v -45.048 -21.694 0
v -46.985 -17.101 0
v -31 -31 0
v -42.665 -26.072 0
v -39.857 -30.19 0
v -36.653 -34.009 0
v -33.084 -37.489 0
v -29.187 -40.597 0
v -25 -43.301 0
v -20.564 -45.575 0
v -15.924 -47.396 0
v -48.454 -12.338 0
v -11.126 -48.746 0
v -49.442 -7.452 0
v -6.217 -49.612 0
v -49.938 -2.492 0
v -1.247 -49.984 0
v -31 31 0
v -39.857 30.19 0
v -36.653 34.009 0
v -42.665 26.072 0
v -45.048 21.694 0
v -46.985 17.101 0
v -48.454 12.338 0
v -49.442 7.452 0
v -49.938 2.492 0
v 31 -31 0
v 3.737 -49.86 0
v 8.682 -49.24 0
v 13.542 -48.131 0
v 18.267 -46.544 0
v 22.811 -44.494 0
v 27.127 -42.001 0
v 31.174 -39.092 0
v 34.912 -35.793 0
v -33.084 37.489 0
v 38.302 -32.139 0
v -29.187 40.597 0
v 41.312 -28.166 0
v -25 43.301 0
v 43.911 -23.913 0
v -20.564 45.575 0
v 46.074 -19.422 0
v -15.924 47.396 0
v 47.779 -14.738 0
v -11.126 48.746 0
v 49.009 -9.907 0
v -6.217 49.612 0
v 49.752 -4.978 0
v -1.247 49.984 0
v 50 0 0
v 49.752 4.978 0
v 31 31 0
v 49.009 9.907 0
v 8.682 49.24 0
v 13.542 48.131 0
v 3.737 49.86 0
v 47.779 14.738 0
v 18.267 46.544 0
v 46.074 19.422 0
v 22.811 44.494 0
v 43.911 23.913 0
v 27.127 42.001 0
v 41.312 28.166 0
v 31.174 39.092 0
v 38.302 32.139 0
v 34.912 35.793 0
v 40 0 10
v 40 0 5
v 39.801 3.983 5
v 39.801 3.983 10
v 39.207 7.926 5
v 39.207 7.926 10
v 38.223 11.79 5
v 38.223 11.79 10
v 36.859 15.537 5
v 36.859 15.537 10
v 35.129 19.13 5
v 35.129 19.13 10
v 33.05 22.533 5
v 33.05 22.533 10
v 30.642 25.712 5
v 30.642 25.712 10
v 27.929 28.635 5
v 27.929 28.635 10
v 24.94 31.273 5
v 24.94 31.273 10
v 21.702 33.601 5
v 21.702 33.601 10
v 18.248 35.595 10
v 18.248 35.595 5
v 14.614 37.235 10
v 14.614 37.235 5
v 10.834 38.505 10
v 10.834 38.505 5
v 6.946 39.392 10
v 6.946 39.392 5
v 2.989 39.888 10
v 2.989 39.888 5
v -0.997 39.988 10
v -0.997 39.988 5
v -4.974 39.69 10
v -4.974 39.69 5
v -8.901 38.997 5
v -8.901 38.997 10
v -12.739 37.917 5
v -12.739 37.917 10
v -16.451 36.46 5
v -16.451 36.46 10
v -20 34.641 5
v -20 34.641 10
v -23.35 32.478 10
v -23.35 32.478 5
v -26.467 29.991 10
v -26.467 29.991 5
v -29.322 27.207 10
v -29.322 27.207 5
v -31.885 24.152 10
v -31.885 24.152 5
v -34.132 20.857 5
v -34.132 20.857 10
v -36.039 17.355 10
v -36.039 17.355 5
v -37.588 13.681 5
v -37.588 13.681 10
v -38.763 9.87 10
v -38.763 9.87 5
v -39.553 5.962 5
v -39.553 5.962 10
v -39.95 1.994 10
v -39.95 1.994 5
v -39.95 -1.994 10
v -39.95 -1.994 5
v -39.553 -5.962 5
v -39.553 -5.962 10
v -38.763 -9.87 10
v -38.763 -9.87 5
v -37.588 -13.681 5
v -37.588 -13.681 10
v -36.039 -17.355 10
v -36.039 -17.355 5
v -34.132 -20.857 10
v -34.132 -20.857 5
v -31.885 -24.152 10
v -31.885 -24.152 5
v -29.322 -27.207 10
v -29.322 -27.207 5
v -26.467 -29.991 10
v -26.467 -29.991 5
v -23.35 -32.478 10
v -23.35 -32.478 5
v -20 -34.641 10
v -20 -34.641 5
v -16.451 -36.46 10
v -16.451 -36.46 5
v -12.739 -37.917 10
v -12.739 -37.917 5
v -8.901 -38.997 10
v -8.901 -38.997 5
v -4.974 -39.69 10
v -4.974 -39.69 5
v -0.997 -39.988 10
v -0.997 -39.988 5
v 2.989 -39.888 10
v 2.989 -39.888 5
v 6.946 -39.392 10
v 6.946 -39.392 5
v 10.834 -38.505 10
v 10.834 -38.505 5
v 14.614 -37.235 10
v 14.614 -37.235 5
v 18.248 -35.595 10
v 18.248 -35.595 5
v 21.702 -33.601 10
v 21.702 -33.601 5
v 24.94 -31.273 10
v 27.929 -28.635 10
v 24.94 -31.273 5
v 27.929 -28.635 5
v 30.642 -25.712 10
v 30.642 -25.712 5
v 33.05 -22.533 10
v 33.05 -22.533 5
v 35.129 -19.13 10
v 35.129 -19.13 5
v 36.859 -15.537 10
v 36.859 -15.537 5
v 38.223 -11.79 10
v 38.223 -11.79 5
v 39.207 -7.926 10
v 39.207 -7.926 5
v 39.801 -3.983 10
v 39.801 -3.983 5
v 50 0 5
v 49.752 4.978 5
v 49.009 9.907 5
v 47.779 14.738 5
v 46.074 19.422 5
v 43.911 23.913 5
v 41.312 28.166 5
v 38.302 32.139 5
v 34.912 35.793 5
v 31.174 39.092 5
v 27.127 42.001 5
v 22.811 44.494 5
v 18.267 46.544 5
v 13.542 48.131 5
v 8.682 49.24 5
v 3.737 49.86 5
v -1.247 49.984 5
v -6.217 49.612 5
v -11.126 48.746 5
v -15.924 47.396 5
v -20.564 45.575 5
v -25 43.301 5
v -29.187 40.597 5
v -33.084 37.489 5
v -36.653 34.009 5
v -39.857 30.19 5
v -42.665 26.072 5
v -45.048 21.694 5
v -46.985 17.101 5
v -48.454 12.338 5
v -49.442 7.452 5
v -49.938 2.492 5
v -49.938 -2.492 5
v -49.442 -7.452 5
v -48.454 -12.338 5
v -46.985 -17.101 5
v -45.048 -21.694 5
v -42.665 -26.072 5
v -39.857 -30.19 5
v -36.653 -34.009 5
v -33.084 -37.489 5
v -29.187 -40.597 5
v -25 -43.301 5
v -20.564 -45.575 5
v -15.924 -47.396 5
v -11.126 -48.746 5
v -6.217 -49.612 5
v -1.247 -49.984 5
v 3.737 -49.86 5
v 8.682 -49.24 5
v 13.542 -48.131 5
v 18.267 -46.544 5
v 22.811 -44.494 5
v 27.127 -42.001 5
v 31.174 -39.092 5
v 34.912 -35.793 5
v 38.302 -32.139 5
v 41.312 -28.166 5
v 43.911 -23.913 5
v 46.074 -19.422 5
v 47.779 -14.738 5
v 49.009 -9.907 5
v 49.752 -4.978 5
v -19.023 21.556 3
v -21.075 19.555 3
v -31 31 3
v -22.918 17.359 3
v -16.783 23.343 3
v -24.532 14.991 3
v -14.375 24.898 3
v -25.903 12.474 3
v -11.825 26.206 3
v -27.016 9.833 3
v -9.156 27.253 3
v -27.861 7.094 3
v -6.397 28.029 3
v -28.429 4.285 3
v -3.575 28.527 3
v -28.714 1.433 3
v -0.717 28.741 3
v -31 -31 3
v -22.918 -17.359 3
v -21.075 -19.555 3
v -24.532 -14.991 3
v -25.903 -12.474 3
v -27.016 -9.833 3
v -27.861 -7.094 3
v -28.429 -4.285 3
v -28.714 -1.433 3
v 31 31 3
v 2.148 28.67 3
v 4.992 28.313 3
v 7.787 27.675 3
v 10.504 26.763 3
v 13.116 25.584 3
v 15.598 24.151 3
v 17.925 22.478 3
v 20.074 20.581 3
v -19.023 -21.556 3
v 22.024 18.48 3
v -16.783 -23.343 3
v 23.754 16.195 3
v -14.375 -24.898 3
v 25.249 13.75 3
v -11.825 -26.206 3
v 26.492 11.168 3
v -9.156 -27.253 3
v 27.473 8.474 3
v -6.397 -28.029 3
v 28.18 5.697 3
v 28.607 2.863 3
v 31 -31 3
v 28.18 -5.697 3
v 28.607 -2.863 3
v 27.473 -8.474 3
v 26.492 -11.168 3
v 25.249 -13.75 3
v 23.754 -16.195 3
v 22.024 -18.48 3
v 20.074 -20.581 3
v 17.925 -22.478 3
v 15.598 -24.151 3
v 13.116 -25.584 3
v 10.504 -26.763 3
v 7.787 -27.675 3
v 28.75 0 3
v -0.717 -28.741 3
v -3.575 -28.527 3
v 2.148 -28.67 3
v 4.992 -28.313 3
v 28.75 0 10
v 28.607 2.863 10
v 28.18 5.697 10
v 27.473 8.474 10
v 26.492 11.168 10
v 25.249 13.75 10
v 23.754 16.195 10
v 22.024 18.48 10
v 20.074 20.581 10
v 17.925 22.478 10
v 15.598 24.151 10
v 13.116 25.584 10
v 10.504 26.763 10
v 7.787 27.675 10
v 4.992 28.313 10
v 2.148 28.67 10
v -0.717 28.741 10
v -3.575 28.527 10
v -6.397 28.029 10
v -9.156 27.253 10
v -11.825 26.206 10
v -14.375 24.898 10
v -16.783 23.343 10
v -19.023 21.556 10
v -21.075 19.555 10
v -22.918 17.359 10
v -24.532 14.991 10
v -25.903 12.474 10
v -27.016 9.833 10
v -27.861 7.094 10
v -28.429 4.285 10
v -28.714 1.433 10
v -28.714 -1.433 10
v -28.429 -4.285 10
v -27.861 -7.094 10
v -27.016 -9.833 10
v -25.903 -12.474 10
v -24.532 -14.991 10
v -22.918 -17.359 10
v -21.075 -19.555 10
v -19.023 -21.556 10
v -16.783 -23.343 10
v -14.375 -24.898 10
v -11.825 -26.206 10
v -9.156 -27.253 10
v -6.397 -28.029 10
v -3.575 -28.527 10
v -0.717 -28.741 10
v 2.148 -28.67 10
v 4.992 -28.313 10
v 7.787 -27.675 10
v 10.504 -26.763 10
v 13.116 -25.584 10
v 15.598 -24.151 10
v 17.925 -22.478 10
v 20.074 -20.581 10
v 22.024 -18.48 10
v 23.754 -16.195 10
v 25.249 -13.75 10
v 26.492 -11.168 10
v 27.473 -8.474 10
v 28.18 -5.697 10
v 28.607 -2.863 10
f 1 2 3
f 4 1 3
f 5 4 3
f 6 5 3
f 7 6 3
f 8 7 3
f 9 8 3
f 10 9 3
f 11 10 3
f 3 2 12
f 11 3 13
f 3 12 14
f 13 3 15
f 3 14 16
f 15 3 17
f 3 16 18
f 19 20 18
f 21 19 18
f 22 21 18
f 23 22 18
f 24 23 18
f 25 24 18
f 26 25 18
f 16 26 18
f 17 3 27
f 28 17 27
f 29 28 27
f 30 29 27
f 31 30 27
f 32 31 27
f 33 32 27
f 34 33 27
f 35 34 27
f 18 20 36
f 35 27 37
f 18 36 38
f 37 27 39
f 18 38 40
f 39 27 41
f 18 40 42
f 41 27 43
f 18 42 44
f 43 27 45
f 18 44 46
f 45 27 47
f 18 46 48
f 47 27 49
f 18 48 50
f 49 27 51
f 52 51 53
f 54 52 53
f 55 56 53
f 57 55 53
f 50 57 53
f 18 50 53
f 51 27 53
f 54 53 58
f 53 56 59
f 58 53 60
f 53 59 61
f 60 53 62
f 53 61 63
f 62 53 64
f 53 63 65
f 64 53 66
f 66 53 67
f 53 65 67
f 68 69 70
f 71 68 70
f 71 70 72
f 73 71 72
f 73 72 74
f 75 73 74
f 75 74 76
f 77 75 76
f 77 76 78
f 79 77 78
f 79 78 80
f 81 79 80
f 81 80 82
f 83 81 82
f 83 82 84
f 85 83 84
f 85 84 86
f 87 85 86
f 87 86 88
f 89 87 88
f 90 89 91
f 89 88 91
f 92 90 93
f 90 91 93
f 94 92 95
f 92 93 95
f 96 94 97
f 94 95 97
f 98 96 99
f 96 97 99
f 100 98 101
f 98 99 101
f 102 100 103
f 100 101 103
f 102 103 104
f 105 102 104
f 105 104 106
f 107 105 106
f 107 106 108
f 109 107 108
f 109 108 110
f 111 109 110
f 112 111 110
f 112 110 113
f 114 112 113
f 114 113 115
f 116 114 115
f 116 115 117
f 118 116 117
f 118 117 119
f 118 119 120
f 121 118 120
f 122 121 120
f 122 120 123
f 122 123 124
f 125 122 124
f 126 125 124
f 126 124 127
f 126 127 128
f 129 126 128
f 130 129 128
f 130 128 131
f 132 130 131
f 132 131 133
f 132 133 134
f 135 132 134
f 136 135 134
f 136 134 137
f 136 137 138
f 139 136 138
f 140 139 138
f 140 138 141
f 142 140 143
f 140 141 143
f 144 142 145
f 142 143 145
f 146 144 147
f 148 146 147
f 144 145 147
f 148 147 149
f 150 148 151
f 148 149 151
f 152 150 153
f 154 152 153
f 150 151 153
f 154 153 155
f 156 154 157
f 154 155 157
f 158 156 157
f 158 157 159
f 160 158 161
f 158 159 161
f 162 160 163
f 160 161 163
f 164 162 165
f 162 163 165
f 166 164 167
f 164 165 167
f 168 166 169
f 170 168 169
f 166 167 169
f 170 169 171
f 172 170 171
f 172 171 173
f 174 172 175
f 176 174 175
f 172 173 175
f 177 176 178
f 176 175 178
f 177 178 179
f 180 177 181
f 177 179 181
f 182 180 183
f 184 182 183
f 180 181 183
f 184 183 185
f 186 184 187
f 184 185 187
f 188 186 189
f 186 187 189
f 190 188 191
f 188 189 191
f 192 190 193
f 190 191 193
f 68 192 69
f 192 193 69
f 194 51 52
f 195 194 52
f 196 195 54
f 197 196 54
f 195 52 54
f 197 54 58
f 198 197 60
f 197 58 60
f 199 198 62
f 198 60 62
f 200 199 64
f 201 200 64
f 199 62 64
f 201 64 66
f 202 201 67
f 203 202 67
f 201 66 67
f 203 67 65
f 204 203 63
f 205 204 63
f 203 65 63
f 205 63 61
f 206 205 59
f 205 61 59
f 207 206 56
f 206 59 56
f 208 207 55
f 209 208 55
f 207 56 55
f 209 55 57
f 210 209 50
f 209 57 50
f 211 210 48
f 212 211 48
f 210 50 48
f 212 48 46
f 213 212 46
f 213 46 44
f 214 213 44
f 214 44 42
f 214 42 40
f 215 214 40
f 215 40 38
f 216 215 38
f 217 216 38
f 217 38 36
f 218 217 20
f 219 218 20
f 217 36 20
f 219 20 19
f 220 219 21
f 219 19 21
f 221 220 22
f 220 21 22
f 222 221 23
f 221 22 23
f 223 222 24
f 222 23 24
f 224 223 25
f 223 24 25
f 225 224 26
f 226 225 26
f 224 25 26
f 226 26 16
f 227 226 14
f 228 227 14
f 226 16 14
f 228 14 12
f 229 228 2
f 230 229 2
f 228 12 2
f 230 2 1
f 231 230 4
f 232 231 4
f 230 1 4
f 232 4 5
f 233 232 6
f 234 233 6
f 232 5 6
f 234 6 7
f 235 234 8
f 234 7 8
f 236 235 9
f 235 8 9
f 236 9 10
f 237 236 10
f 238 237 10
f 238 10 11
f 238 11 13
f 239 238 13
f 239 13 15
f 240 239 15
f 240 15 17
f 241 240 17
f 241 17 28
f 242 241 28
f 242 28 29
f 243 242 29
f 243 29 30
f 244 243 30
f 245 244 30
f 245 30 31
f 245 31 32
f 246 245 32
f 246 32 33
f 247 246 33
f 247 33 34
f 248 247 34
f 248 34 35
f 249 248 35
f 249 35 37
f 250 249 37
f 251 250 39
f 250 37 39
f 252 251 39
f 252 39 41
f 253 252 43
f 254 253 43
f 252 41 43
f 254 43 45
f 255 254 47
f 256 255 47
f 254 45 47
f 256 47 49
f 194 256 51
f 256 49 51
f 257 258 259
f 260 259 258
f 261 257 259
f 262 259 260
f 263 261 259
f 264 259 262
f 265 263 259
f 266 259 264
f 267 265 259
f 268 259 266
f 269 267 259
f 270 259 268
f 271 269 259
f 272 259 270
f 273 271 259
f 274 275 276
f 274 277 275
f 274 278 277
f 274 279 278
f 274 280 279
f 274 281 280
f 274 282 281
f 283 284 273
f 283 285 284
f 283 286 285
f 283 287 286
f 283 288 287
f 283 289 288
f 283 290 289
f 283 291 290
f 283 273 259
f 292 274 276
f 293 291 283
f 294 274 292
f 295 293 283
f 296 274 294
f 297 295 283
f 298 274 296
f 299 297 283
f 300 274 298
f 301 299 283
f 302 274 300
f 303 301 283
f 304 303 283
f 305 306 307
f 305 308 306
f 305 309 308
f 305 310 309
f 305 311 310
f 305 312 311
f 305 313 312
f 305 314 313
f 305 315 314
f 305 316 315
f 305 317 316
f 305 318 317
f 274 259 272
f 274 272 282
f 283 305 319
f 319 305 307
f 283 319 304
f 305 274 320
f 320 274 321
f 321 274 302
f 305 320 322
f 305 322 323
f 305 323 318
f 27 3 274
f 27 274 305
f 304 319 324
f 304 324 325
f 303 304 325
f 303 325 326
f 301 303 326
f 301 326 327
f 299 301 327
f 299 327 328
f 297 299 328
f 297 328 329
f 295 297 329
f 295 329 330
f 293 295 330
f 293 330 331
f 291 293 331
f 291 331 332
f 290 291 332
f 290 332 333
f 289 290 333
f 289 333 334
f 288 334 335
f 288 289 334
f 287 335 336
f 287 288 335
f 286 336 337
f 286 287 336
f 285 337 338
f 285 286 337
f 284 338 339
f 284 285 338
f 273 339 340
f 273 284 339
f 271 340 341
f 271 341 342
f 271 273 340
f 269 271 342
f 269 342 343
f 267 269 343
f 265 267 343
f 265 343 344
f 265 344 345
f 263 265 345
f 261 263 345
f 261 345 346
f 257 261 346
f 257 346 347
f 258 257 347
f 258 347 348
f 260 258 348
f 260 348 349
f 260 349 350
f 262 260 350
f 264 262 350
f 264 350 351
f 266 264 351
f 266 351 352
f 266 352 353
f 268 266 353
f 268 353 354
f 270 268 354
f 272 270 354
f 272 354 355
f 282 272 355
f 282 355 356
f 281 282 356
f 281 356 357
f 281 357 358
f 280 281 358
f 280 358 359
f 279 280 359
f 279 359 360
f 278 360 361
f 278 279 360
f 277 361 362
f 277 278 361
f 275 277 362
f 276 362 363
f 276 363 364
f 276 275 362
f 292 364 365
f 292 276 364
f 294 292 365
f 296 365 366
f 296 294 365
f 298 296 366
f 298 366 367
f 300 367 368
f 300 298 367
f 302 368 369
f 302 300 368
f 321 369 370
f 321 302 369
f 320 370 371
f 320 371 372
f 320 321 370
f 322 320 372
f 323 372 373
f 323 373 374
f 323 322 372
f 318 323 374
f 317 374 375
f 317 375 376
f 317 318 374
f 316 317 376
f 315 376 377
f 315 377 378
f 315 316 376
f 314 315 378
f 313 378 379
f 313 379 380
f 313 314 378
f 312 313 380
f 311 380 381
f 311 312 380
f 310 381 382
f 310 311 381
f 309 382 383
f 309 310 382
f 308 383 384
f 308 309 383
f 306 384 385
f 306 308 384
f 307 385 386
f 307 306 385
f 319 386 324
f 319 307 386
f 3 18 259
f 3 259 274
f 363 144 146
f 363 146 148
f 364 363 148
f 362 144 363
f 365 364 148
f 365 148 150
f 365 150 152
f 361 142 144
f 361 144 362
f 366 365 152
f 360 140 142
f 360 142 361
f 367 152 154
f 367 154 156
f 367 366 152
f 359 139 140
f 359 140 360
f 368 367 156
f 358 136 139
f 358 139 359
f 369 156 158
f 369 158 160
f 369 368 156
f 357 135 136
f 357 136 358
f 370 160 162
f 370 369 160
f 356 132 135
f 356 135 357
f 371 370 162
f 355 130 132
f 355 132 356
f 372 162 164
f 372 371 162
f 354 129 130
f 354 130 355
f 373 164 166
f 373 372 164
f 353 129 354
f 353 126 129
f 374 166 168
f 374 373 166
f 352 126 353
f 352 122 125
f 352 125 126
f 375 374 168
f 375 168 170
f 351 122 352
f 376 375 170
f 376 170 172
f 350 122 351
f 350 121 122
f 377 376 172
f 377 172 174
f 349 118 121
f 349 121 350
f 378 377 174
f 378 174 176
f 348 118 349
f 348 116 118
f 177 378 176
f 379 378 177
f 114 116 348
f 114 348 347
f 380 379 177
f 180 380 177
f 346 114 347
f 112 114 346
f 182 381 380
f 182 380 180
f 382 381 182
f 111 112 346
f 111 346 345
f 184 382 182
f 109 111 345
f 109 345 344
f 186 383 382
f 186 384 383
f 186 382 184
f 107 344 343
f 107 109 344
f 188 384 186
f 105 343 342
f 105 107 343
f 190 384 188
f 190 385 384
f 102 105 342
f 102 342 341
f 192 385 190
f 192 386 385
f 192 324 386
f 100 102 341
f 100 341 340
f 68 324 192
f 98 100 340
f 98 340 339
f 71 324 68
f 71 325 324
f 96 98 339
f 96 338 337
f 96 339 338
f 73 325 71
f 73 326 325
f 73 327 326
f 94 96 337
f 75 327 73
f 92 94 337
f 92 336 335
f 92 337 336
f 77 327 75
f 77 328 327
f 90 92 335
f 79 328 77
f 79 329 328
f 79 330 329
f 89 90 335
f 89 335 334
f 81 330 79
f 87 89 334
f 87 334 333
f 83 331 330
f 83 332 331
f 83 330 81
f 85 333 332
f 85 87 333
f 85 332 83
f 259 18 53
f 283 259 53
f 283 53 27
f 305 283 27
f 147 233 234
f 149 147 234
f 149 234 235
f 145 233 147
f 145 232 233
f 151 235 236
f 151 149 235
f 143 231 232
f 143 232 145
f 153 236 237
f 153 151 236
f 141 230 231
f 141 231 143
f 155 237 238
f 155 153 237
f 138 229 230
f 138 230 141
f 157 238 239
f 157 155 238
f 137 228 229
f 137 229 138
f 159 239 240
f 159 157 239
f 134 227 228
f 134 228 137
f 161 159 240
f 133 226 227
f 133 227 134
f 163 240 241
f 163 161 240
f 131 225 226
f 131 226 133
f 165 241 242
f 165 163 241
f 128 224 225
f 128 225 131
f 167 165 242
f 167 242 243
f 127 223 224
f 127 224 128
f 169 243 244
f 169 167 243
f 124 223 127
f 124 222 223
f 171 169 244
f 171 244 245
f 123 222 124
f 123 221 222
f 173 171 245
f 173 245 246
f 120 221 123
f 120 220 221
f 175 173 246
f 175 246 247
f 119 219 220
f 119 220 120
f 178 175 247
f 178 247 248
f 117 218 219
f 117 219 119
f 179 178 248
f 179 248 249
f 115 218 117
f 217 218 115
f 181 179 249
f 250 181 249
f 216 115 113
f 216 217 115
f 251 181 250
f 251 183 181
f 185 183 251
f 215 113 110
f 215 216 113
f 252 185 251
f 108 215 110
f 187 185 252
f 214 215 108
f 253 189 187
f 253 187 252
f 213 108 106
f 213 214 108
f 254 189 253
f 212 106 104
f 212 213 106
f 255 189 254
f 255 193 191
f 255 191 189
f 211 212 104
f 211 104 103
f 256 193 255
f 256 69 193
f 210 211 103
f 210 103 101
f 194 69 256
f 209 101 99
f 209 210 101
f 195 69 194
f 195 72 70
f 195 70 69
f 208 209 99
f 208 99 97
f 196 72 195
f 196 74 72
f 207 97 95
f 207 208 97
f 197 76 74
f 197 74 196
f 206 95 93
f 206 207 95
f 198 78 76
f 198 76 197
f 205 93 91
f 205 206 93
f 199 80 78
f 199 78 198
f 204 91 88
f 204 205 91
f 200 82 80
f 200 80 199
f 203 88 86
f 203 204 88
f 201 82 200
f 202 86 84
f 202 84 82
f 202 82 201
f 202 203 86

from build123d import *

# Parameters (mm, degrees)
F0_R     = 50
F0_R_2   = 40
F0_R_3   = 28.75
F1_DEPTH = 5
F2_DEPTH = 10
F3_W     = 62
F3_H     = 62
F3_R     = 28.75
F4_DEPTH = 3


with BuildPart() as f1:
    # F0 (on Top) → F1 (new body)
    with BuildSketch(Plane.XY):
        Circle(F0_R)
        Circle(F0_R_2, mode=Mode.SUBTRACT)
        Circle(F0_R_2)
        Circle(F0_R_3, mode=Mode.SUBTRACT)
    extrude(amount=F1_DEPTH)

    # F0 (on Top) → F2 (join)
    with BuildSketch(Plane.XY):
        Circle(F0_R_2)
        Circle(F0_R_3, mode=Mode.SUBTRACT)
    extrude(amount=F2_DEPTH)

    # F3 (on face) → F4 (cut)
    with BuildSketch(Plane(origin=(0, 0, 0), x_dir=(1, 0, 0), z_dir=(0, 0, -1))):
        Rectangle(F3_W, F3_H)
        Circle(F3_R, mode=Mode.SUBTRACT)
    extrude(amount=-F4_DEPTH, mode=Mode.SUBTRACT)


solid = f1.part
